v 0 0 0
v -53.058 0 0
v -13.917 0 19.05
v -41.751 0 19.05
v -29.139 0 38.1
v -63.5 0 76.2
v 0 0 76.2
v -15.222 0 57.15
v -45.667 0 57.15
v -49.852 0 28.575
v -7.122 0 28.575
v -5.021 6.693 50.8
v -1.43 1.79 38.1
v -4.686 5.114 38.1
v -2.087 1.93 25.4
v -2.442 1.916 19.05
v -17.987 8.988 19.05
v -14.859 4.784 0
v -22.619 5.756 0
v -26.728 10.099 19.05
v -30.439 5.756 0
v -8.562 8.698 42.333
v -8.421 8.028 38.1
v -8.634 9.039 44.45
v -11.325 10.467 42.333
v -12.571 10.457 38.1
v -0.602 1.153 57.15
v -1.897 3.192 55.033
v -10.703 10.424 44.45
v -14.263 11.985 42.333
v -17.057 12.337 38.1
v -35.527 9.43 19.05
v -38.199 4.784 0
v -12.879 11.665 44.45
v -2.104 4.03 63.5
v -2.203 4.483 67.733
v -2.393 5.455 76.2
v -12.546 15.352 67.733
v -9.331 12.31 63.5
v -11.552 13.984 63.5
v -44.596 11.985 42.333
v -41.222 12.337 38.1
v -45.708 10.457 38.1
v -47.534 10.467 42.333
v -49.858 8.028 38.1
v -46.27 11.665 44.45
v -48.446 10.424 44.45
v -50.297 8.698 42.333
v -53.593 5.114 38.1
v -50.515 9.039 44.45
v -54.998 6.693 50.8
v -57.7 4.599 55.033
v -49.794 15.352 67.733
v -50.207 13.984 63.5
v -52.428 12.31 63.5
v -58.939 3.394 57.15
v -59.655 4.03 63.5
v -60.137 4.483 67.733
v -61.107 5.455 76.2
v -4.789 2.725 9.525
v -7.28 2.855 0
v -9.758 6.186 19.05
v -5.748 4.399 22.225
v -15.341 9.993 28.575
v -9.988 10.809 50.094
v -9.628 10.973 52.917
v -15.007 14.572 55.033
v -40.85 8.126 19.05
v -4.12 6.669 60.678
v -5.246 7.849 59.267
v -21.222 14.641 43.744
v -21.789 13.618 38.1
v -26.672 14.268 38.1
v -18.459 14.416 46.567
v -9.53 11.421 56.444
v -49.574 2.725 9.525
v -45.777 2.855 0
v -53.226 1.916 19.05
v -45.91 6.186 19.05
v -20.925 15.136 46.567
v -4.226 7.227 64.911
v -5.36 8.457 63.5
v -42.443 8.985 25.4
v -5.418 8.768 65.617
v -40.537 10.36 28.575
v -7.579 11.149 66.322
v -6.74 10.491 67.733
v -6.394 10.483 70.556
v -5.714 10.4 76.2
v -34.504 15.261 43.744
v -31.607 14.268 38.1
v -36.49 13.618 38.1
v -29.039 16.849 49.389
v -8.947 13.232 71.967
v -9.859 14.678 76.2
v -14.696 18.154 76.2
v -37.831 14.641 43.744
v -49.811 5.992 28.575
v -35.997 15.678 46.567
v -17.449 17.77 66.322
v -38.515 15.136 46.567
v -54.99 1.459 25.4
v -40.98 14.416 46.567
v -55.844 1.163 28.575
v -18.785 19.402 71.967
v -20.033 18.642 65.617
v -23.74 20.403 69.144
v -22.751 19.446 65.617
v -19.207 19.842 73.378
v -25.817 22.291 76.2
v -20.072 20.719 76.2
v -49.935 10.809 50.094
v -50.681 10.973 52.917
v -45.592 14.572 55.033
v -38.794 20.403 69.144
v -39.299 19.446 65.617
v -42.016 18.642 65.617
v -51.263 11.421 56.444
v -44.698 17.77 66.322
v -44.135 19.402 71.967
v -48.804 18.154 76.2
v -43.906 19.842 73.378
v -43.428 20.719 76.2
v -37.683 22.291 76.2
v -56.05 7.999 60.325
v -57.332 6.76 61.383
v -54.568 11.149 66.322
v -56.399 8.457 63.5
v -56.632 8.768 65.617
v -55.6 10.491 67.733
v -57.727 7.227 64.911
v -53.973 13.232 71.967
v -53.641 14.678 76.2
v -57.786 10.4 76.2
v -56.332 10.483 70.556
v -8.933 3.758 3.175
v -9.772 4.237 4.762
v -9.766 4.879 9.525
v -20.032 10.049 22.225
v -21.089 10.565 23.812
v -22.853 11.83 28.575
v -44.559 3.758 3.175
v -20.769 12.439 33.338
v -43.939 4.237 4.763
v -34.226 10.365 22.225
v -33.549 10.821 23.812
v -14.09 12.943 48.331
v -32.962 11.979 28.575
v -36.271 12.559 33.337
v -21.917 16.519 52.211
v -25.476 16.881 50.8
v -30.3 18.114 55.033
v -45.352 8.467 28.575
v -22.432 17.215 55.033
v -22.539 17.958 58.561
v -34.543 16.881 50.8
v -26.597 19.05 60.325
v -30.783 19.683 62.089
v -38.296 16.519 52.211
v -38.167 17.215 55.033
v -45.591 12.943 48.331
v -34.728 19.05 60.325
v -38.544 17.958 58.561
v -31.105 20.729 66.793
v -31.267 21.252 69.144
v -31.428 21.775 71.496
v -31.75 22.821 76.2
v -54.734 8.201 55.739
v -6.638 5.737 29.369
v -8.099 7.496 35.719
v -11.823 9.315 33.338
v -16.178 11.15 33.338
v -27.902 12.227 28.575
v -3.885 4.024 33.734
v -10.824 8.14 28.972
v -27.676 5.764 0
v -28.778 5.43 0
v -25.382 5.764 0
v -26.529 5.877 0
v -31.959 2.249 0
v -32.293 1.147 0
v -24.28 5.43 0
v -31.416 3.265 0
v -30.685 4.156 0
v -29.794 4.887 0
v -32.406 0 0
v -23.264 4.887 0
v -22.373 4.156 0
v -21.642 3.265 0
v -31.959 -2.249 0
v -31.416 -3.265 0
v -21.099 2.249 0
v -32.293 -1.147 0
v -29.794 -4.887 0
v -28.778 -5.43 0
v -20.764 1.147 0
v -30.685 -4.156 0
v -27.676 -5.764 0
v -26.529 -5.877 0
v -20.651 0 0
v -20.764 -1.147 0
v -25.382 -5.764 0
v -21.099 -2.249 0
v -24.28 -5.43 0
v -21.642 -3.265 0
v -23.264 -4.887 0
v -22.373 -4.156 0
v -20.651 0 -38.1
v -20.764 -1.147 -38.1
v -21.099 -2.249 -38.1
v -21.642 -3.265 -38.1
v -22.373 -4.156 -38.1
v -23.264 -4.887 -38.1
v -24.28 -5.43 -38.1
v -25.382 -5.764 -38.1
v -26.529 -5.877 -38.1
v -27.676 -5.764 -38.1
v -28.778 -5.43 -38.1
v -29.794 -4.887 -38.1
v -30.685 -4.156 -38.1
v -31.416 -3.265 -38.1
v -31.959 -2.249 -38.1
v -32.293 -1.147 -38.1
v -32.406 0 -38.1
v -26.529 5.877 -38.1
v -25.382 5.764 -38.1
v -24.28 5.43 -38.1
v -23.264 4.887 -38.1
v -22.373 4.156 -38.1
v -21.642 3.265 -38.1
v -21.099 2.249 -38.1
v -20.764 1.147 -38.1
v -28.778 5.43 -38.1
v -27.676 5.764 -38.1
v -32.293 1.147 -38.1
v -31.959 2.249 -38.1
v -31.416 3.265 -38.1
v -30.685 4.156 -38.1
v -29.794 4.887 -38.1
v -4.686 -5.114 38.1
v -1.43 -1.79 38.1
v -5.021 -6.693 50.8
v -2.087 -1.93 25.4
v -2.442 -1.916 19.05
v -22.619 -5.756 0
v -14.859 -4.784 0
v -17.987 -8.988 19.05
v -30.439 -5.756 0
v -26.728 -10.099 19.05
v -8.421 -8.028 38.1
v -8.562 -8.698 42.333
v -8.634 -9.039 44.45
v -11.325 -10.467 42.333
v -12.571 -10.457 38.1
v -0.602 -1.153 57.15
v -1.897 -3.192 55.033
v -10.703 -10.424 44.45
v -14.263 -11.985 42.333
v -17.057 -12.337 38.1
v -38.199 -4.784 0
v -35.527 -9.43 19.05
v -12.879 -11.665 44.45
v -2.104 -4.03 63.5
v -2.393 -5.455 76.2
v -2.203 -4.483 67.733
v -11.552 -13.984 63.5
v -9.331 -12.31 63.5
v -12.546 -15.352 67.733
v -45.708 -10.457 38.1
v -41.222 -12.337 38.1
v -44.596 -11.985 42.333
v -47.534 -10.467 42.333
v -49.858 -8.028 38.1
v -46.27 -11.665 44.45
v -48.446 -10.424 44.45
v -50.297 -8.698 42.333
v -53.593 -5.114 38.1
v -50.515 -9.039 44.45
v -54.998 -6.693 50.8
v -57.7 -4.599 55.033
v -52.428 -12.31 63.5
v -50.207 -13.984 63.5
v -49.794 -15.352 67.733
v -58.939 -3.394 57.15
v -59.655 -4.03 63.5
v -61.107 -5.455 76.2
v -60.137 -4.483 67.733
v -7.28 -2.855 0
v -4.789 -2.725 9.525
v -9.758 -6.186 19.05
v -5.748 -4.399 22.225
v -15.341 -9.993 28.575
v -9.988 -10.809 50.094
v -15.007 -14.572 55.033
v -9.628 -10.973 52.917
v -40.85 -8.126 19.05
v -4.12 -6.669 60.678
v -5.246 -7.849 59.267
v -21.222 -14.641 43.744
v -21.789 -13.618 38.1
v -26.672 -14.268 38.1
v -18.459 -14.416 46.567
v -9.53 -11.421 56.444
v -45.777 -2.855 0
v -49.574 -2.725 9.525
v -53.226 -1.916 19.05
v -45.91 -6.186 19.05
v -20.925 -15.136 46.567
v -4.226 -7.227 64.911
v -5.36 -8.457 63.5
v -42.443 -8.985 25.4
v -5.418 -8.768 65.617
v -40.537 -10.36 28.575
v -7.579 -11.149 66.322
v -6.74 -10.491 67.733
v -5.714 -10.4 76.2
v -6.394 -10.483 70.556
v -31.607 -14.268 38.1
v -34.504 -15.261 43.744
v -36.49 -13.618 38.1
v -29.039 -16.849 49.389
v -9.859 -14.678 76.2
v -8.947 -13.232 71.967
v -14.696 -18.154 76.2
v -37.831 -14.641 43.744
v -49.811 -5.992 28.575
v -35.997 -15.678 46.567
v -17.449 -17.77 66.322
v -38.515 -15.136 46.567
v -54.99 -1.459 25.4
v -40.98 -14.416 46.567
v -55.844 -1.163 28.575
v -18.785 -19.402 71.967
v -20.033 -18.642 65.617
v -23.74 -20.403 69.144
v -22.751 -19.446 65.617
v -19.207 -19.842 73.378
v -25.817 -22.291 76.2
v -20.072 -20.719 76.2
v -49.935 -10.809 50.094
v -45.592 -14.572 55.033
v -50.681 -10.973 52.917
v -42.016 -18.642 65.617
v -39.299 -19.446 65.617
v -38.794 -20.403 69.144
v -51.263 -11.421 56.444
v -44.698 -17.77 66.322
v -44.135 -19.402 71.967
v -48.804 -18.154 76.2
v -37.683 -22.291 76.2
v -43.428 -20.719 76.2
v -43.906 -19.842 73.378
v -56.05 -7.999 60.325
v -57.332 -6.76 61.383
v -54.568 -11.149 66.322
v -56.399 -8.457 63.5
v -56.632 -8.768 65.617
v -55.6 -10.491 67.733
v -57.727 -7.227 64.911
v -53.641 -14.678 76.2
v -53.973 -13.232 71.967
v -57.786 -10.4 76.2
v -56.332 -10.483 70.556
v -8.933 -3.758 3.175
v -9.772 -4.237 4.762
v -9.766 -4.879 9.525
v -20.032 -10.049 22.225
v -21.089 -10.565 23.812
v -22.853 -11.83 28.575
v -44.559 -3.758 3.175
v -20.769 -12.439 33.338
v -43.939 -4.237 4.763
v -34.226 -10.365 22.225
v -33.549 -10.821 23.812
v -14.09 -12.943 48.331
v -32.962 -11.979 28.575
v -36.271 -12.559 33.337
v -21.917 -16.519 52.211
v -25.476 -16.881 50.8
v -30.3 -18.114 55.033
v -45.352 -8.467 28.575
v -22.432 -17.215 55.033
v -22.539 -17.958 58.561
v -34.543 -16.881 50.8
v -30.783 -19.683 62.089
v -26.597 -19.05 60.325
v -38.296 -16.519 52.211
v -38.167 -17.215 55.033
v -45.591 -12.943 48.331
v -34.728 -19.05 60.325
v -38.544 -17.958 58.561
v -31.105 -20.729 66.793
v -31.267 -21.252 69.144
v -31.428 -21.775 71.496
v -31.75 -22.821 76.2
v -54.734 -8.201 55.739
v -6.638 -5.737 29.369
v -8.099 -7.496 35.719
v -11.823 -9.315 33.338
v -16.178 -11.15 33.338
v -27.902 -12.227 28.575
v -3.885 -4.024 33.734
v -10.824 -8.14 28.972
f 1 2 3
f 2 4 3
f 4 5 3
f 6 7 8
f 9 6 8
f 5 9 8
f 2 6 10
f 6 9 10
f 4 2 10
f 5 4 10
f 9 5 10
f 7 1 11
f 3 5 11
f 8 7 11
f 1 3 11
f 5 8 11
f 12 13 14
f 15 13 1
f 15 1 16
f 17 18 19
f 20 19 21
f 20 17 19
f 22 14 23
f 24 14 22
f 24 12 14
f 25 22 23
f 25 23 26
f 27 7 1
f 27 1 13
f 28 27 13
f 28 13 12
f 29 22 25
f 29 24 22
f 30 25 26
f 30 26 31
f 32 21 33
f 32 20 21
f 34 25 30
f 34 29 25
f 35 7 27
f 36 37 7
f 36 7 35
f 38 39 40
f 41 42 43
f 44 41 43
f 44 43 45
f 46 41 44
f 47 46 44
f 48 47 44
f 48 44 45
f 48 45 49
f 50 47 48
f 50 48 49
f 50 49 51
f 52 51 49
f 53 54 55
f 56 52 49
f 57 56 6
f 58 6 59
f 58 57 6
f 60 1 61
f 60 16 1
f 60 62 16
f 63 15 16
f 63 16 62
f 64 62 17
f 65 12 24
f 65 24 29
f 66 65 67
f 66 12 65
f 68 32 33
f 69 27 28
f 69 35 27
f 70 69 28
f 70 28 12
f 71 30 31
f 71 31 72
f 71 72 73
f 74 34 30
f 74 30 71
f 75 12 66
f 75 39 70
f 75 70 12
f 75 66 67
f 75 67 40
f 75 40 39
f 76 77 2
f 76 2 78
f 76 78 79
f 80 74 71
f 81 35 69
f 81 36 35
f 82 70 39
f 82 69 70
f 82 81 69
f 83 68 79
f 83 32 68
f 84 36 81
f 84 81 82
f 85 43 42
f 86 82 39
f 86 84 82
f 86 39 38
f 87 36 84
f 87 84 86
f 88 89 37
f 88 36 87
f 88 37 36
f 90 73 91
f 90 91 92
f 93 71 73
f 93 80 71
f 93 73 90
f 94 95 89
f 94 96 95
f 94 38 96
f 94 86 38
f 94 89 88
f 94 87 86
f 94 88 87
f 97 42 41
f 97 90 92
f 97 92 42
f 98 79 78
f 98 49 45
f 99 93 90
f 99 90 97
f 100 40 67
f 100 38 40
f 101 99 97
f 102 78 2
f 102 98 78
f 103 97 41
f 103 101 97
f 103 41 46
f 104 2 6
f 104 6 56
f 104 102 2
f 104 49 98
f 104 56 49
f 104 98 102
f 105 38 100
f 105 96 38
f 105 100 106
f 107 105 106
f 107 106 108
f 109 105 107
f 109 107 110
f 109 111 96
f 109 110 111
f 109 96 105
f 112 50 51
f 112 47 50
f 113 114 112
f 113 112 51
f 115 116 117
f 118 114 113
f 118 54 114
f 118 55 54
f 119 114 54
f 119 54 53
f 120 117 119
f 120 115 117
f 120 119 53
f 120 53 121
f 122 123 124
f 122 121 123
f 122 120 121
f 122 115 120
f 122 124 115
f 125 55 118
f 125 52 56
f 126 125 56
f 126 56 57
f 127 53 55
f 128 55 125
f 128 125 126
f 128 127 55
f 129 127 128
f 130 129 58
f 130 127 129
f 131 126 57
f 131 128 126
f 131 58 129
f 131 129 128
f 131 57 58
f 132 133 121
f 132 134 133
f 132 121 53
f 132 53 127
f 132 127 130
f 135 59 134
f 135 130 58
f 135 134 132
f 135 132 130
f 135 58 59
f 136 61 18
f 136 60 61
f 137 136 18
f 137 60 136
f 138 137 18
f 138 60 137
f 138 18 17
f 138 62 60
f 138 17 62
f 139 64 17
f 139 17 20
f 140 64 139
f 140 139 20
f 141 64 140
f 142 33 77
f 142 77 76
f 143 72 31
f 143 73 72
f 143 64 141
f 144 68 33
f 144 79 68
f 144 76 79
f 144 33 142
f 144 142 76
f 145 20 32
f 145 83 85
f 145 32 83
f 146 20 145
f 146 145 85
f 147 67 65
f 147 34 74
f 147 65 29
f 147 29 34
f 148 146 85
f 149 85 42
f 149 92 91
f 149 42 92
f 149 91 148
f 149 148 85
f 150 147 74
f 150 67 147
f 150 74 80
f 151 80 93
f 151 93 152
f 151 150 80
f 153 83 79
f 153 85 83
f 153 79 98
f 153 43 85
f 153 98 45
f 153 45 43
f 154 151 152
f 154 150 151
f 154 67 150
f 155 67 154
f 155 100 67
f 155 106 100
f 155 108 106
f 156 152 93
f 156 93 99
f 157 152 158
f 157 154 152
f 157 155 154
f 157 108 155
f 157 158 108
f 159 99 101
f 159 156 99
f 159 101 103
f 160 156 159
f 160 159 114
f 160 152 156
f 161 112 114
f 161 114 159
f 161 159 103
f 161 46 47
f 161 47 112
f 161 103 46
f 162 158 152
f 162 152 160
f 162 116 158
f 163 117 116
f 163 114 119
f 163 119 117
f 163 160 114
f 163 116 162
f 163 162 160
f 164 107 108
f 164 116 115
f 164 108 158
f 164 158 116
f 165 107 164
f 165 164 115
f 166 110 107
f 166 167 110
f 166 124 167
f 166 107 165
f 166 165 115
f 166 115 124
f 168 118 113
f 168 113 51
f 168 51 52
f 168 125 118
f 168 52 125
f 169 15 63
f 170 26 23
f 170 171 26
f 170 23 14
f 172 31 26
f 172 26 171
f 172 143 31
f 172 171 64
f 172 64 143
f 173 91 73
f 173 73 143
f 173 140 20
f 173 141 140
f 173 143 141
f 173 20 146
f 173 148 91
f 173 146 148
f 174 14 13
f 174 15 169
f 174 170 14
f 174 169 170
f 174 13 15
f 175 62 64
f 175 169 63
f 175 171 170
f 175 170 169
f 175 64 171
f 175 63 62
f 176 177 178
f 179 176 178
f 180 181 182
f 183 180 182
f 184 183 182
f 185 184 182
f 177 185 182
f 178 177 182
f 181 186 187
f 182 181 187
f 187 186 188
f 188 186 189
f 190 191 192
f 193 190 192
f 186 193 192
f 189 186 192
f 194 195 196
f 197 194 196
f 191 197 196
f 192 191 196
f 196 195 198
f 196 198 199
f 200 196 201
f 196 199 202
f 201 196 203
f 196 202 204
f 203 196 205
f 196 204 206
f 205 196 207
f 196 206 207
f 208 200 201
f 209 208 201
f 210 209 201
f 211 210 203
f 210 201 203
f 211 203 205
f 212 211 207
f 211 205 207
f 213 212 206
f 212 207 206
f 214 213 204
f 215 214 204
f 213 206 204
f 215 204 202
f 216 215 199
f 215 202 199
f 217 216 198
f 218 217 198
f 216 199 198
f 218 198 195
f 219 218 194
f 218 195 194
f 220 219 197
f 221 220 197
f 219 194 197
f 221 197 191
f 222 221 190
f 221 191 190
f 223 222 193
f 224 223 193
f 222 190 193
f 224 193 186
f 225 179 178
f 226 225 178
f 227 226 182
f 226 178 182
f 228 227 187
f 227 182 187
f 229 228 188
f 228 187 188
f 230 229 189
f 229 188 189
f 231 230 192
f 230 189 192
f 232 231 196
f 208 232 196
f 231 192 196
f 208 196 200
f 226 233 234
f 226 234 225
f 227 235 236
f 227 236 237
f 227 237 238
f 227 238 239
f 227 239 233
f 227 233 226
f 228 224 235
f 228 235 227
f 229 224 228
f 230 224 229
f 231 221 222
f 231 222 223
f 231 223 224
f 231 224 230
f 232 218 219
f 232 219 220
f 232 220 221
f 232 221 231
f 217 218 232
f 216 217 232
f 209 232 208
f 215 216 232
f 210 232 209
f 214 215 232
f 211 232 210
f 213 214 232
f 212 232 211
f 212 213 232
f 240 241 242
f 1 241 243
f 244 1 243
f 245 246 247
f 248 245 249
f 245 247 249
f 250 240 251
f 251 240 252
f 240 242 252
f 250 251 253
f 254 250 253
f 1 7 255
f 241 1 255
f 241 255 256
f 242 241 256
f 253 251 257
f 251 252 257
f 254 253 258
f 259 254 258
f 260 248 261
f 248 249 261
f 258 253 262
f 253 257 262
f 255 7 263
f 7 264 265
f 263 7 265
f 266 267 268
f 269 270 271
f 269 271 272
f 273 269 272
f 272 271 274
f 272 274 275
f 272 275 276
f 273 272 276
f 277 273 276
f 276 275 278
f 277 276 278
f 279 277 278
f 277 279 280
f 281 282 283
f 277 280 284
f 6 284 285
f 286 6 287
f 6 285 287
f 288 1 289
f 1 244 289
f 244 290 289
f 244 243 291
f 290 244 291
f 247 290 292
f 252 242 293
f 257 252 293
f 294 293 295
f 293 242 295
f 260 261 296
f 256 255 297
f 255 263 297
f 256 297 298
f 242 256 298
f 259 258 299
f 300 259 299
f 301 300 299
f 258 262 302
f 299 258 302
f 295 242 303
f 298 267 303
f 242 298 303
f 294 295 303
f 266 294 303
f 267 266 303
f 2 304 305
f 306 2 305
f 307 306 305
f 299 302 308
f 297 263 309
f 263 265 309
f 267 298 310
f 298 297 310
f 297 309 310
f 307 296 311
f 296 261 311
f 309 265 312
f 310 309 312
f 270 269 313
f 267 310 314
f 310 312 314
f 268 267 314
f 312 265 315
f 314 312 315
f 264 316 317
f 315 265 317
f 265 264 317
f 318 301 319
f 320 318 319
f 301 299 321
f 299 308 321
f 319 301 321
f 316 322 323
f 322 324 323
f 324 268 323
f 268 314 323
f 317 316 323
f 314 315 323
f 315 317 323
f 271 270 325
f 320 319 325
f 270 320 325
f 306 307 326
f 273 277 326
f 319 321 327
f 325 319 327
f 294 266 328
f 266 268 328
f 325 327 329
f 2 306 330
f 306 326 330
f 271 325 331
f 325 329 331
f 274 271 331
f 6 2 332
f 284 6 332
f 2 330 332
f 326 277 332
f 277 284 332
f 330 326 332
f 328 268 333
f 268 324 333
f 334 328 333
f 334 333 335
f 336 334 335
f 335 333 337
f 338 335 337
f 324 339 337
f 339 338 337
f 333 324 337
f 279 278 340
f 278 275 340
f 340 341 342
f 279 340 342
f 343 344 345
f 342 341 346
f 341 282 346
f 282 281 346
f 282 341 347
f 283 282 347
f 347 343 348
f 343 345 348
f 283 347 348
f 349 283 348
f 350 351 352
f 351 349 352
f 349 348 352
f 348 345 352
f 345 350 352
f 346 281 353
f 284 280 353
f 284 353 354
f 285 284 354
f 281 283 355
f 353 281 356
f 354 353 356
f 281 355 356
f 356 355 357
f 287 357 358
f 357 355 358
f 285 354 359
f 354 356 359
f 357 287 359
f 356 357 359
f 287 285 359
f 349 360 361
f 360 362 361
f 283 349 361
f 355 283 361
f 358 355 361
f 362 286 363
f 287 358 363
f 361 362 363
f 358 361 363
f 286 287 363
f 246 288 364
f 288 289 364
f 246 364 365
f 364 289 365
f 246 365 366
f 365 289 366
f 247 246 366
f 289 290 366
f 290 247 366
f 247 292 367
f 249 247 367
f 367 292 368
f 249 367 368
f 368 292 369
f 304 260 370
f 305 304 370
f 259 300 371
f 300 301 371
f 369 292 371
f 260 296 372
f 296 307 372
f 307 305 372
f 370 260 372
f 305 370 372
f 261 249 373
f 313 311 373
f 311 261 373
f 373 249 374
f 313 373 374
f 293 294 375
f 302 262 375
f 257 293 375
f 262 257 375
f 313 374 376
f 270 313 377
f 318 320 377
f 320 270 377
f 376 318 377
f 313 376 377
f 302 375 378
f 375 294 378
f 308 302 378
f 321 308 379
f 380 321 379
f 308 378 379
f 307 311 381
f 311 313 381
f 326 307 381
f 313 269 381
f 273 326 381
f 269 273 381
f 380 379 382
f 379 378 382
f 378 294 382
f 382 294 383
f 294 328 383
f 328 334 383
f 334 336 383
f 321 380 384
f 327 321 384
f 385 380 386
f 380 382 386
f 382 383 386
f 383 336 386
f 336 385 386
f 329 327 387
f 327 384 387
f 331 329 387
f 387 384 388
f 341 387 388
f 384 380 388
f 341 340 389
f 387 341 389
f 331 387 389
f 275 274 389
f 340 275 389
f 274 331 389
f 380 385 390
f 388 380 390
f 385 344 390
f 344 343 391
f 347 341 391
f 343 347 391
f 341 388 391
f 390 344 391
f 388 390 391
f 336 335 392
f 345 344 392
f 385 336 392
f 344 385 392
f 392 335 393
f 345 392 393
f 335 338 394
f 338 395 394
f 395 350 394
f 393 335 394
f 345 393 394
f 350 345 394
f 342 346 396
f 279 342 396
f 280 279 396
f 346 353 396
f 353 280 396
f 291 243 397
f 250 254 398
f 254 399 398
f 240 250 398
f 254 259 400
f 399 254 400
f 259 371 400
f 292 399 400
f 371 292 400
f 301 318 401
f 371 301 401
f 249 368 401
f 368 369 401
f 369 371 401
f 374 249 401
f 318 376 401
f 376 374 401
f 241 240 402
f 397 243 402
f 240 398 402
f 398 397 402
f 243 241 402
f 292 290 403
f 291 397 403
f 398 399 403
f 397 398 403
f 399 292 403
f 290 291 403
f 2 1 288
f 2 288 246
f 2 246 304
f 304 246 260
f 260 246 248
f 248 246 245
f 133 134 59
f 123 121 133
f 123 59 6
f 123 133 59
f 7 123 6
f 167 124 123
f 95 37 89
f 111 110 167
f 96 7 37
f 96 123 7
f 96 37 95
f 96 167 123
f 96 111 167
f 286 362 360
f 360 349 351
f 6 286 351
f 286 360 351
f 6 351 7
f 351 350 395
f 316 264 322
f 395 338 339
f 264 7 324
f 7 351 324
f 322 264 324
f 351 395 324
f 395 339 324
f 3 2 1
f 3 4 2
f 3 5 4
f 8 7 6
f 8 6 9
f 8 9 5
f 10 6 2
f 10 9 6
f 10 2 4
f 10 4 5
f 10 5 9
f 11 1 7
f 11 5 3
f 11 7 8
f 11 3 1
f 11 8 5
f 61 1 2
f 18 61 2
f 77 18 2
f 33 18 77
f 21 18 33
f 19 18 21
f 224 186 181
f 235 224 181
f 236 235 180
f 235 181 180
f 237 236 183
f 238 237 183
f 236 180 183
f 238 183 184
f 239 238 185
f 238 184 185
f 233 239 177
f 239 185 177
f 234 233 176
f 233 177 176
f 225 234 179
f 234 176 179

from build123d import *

# Parameters (mm, degrees)
F6_DEPTH = 38.1
F7_W     = 46.2397178635
F7_H     = 23.6593596637
F8_DEPTH = 26.035


with BuildPart() as f3:
    # F0 (on Top) → F3 section 0
    with BuildSketch(Plane.XY):
        with BuildLine():
            Line((-53.0577786267, 0), (0, 0))
            ThreePointArc((0, 0), (-26.5288893133, 5.8774279625), (-53.0577786267, 0))
        make_face()
    # F2 (on offset) → F3 section 1
    with BuildSketch(Plane.XY.offset(76.2)):
        with BuildLine():
            ThreePointArc((0, 0), (-31.75, 22.8209221644), (-63.5, 0))
            Line((-63.5, 0), (0, 0))
        make_face()
    loft()


with BuildPart() as f4_1:
    # F4: instance of F3
    add(f3.part.mirror(Plane.XZ))


with BuildPart() as f6:
    # F5 (on face) → F6 (new body)
    with BuildSketch(Plane(origin=(0, 0, 0), x_dir=(1, 0, 0), z_dir=(0, 0, -1))):
        with BuildLine():
            ThreePointArc((-26.5288893829, -5.8774279623), (-22.3729201699, -4.1559691926), (-20.6514613511, 0))
            Line((-20.6514613511, 0), (-32.4063172756, 0))
            ThreePointArc((-32.4063172756, 0), (-30.684858506, -4.1559691435), (-26.5288893829, -5.8774279623))
        make_face()
        with BuildLine():
            Line((-32.4063172756, 0), (-20.6514613511, 0))
            ThreePointArc((-20.6514613511, 0), (-26.5288893133, 5.8774279623), (-32.4063172756, 0))
        make_face()
    extrude(amount=F6_DEPTH)


with BuildPart() as f8:
    # F7 (on Front) → F8 (new body)
    with BuildSketch(Plane.XZ):
        with Locations((37.5585299917, 11.8296798319)):
            Rectangle(F7_W, F7_H)
    extrude(amount=F8_DEPTH)


solid = Compound([f3.part, f4_1.part, f6.part])
